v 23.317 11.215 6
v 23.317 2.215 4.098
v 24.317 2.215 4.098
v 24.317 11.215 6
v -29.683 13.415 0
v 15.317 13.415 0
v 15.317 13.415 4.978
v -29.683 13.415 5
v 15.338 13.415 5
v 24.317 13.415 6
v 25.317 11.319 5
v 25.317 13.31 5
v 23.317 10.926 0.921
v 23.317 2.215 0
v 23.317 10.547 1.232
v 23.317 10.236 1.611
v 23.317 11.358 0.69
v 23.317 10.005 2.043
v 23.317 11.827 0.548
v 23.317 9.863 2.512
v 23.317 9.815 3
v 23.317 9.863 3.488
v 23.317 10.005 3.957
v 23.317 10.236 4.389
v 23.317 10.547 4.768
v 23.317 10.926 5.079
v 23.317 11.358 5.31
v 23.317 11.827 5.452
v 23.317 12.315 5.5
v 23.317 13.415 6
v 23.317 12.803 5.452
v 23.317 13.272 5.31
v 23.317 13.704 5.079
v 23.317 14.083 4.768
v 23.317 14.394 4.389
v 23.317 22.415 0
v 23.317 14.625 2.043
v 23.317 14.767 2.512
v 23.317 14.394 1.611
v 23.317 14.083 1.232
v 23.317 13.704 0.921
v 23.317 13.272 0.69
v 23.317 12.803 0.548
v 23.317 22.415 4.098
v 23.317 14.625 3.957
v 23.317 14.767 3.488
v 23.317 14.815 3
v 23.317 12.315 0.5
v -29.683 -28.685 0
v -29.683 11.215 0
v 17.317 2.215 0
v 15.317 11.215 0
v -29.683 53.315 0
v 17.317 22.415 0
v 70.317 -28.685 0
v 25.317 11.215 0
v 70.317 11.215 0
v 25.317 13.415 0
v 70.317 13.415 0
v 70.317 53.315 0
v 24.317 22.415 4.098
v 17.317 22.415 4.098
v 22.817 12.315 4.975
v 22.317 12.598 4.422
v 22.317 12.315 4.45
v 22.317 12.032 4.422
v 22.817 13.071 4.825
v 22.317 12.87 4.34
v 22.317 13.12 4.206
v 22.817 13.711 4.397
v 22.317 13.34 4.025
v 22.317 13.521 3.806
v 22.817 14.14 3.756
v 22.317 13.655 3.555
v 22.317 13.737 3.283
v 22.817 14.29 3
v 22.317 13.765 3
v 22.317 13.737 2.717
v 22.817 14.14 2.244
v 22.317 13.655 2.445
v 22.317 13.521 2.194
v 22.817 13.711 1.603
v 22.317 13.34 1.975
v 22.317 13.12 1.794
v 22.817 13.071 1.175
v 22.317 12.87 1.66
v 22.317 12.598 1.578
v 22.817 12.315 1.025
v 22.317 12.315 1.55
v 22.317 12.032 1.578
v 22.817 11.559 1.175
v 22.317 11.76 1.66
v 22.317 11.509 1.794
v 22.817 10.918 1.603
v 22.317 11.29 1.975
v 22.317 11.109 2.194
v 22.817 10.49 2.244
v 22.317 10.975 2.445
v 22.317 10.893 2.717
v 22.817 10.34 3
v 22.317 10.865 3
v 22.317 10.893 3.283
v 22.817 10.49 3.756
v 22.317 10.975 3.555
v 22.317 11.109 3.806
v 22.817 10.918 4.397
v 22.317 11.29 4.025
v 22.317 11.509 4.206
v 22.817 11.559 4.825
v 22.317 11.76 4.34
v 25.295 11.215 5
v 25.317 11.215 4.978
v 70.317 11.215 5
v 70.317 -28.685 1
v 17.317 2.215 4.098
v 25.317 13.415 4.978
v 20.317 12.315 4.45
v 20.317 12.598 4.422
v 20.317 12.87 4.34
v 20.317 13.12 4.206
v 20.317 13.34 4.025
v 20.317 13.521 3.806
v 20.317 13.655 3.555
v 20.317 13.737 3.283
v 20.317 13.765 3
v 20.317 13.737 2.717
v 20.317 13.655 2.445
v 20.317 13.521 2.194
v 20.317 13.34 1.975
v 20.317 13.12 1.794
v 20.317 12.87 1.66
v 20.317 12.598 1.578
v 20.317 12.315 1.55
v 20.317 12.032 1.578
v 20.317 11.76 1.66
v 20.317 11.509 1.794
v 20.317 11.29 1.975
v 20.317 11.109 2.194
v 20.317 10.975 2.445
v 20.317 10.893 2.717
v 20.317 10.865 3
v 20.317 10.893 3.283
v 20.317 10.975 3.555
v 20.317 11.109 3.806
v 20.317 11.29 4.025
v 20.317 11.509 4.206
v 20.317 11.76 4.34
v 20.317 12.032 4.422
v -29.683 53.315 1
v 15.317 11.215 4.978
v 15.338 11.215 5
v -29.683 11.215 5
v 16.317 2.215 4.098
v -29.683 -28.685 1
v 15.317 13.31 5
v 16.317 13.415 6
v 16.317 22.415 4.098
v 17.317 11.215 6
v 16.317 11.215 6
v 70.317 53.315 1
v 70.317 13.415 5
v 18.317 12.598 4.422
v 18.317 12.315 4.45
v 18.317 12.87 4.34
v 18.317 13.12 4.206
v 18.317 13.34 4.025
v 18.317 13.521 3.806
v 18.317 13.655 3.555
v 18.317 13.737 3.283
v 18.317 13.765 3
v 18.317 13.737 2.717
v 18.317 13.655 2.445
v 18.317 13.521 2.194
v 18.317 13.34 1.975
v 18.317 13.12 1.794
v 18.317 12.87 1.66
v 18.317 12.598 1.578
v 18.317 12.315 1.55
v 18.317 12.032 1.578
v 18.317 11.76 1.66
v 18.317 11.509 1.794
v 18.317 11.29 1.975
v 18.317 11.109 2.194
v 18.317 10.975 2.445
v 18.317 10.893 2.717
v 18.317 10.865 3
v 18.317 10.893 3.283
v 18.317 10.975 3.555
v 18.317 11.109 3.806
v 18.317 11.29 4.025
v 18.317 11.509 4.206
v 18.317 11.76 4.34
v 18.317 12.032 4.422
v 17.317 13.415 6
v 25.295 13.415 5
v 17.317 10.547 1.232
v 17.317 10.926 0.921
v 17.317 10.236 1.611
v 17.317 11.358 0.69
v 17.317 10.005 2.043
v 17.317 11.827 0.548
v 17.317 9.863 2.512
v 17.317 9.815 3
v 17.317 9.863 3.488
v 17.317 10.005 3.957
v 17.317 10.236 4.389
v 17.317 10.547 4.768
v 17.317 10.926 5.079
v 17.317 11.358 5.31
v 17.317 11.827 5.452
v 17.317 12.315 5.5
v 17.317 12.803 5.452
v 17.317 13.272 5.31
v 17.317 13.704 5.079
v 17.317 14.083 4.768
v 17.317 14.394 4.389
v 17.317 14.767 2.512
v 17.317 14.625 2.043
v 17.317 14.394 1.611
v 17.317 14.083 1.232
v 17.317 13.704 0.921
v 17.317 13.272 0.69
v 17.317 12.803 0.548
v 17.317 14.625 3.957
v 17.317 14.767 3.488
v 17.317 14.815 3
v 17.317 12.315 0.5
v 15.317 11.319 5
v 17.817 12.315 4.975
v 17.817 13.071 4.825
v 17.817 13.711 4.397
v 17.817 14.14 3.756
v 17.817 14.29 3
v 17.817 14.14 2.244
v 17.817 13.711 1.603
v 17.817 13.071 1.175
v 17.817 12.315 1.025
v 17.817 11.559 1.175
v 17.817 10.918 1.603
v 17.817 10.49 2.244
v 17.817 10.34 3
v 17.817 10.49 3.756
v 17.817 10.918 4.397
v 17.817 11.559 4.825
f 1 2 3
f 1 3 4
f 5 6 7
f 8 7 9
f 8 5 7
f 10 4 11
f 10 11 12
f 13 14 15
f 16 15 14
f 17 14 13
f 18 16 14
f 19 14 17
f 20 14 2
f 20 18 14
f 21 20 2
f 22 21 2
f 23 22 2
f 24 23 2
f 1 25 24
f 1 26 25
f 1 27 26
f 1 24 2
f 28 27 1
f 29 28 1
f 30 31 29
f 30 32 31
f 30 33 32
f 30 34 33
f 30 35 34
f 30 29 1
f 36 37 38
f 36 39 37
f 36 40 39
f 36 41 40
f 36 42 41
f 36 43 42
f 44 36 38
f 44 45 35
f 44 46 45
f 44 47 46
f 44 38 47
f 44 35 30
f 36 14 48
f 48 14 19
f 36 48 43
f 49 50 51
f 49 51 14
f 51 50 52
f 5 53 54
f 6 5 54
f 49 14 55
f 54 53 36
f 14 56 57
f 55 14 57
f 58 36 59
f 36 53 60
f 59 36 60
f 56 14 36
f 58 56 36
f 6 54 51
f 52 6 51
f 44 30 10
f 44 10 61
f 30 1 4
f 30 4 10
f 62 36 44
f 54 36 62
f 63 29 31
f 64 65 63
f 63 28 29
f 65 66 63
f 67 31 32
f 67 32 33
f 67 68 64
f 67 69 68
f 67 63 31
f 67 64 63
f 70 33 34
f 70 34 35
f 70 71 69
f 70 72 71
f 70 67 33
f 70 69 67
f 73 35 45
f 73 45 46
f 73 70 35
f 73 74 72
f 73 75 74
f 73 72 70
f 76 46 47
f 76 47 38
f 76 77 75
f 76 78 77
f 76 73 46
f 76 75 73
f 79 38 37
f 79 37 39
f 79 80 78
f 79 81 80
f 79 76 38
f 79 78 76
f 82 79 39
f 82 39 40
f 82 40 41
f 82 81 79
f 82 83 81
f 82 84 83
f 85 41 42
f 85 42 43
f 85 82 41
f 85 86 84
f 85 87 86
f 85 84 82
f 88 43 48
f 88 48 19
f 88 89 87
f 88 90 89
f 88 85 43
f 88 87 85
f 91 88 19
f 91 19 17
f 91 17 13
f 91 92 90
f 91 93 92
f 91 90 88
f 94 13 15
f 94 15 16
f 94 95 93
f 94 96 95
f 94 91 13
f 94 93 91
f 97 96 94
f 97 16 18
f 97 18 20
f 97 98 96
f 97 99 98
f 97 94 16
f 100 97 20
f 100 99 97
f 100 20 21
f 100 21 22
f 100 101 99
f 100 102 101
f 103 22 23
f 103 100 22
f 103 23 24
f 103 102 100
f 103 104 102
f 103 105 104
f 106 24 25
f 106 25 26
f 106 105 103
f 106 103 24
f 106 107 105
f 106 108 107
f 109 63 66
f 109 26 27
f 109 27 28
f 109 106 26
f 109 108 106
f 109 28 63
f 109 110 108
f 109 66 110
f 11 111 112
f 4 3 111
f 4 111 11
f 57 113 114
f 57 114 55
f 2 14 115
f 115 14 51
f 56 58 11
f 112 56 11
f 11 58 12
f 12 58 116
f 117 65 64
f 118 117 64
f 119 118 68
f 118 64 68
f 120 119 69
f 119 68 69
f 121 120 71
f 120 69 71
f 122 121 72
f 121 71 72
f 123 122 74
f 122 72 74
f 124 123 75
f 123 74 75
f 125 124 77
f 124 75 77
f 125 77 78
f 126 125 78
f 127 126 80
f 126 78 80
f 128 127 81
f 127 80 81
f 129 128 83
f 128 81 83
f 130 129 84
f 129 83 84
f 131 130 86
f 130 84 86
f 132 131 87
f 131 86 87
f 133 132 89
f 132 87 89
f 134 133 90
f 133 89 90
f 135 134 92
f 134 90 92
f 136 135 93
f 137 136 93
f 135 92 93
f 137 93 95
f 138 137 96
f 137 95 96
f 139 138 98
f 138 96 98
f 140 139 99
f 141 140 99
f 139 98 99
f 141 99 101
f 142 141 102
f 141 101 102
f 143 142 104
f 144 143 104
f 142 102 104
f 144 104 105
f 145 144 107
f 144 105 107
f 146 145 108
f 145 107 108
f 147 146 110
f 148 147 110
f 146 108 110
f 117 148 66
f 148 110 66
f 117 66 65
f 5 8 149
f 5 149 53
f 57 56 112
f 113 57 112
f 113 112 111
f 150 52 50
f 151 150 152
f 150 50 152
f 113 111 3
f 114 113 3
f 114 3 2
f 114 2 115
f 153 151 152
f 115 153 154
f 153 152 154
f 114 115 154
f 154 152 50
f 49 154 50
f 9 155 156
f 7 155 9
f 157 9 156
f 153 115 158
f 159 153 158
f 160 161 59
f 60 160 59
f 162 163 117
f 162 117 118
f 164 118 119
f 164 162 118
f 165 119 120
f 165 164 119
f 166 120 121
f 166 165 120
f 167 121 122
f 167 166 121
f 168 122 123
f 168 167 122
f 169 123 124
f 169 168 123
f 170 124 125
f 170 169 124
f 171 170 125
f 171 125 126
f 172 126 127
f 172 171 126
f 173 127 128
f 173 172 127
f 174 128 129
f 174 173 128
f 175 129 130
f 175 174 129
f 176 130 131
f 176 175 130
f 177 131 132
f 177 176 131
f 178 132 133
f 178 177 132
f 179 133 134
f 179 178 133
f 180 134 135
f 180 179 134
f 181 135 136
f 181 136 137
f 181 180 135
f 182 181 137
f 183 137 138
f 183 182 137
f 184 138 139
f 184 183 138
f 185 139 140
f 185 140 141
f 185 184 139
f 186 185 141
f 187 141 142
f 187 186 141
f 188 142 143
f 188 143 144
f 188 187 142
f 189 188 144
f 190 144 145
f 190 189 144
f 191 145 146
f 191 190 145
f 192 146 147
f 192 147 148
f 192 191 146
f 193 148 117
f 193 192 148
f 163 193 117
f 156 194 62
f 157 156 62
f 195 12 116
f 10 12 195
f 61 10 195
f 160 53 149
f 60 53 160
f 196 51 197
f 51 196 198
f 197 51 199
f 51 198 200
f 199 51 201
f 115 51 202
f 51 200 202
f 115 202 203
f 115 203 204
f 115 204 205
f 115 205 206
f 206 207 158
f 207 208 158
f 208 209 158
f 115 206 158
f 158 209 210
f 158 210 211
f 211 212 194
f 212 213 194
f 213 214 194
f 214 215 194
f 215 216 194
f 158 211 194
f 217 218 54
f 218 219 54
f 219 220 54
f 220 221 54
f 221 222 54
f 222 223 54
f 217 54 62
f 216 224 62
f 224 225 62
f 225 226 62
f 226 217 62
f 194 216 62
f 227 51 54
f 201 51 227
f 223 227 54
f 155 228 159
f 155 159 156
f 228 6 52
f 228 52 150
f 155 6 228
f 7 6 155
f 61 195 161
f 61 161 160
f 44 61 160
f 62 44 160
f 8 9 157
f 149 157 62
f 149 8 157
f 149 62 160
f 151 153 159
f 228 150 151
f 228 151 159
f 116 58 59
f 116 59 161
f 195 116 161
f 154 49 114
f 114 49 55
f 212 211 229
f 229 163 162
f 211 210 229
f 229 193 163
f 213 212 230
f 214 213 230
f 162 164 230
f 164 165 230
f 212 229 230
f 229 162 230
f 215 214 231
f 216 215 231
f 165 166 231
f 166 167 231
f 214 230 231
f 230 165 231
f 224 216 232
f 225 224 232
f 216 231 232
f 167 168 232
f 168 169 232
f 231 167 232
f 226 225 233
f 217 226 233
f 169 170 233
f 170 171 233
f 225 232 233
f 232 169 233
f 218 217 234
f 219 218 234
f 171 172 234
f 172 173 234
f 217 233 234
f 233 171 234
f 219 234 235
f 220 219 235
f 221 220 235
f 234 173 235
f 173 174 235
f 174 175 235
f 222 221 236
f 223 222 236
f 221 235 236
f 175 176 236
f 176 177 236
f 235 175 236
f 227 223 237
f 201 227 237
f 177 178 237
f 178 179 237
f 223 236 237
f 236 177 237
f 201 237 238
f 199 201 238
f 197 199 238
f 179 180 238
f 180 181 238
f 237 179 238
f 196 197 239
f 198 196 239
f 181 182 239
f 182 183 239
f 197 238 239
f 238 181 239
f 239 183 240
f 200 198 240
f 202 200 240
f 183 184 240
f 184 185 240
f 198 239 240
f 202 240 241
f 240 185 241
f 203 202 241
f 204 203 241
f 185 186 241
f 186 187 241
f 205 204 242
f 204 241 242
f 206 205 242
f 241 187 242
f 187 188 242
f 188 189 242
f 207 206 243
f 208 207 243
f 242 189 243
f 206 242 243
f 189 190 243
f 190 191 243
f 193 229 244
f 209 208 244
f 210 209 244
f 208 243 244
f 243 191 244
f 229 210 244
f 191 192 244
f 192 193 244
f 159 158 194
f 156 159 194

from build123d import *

# Parameters (mm, degrees)
DODANIE_WYCI_GNI_CIE1_DEPTH = 1
DODANIE_WYCI_GNI_CIE2_DEPTH = 100
SZKIC3_W                    = 6
SZKIC3_H                    = 9
WYTNIJ_WYCI_GNI_CIE1_DEPTH  = 10
SZKIC4_W                    = 2
SZKIC4_H                    = 5
DODANIE_WYCI_GNI_CIE3_DEPTH = 1.1
DODANIE_WYCI_GNI_CIE5_DEPTH = 2
SZKIC8_R                    = 2.5
SZKIC9_R                    = 1.45
SZKIC10_R                   = 1.45
DODANIE_WYCI_GNI_CIE6_DEPTH = 2
SFAZOWANIE1_SIZE            = 1


with BuildPart() as part:
    # Szkic1 → Dodanie-wyciągnięcie1 (new body)
    with BuildSketch(Plane.XY):
        Polygon((15.316574048, 11.214895549), (-29.683425952, 11.214895549), (-29.683425952, -28.685104451), (70.316574048, -28.685104451), (70.316574048, 11.214895549), (25.316574048, 11.214895549), align=None)
    extrude(amount=DODANIE_WYCI_GNI_CIE1_DEPTH)

    # Szkic2 → Dodanie-wyciągnięcie2 (add)
    with BuildSketch(Plane.ZY.offset(29.683425952)):
        Polygon((1, 11.214895549), (5, 11.214895549), (1, -28.685104451), align=None)
    extrude(amount=-DODANIE_WYCI_GNI_CIE2_DEPTH)

    # Szkic3 → Wytnij-wyciągnięcie1 (cut)
    with BuildSketch(Plane(origin=(0, 0, 0), x_dir=(-1, 0, 0), z_dir=(0, 0, -1))):
        with Locations((-20.316574048, 6.714895549)):
            Rectangle(SZKIC3_W, SZKIC3_H)
    extrude(amount=-WYTNIJ_WYCI_GNI_CIE1_DEPTH, mode=Mode.SUBTRACT)

    # Szkic4 → Dodanie-wyciągnięcie3 (add)
    with BuildSketch(Plane(origin=(0, 11.214895549, 0), x_dir=(1, 0, 0), z_dir=(0, 1, 0))):
        with Locations((24.316574048, -2.5)):
            Rectangle(SZKIC4_W, SZKIC4_H)
        with Locations((16.316574048, -2.5)):
            Rectangle(SZKIC4_W, SZKIC4_H)
    extrude(amount=DODANIE_WYCI_GNI_CIE3_DEPTH)

    # Lustro2: part across plane


with BuildPart() as part_1:
    add(part.part)
    add(part.part.mirror(Plane.ZX.offset(12.314895549)))

    # Szkic7 → Dodanie-wyciągnięcie5 (add)
    with BuildSketch(Plane.ZY.offset(-23.316574048)):
        Polygon((4.097744361, 22.414895549), (5, 13.414895549), (5, 11.214895549), (4.097744361, 2.214895549), (6, 11.214895549), (6, 13.414895549), align=None)
    dodanie_wyci_gni_cie5 = extrude(amount=-DODANIE_WYCI_GNI_CIE5_DEPTH)

    # Szkic8 → Wyciągnięcie po profilach1 section 0
    with BuildSketch(Plane.ZY.offset(-23.316574048)):
        with Locations((3, 12.314895549)):
            Circle(SZKIC8_R)
    # Szkic9 → Wyciągnięcie po profilach1 section 1
    with BuildSketch(Plane.ZY.offset(-22.316574048)):
        with Locations((3, 12.314895549)):
            Circle(SZKIC9_R)
    wyci_gni_cie_po_profilach1 = loft()

    # Szkic10 → Dodanie-wyciągnięcie6 (add)
    with BuildSketch(Plane.ZY.offset(-22.316574048)):
        with Locations((3, 12.314895549)):
            Circle(SZKIC10_R)
    dodanie_wyci_gni_cie6 = extrude(amount=DODANIE_WYCI_GNI_CIE6_DEPTH)

    # Lustro3: Dodanie-wyciągnięcie5, Wyciągnięcie po profilach1, Dodanie-wyciągnięcie6 across plane
    add(dodanie_wyci_gni_cie5.mirror(Plane(origin=(20.316574048, 12.314895549, 3), x_dir=(0, 0, 1), z_dir=(-1, 0, 0))))
    add(wyci_gni_cie_po_profilach1.mirror(Plane(origin=(20.316574048, 12.314895549, 3), x_dir=(0, 0, 1), z_dir=(-1, 0, 0))))
    add(dodanie_wyci_gni_cie6.mirror(Plane(origin=(20.316574048, 12.314895549, 3), x_dir=(0, 0, 1), z_dir=(-1, 0, 0))))

    # Sfazowanie1
    sfazowanie1_edges = [part_1.edges().sort_by_distance(p)[0] for p in [
        (15.316574048, 6.714895549, 5.04887218),
        (15.316574048, 12.314895549, 6),
        (15.316574048, 17.914895549, 5.04887218),
        (25.316574048, 17.914895549, 5.04887218),
        (25.316574048, 12.314895549, 6),
        (25.316574048, 6.714895549, 5.04887218),
    ]]
    chamfer(sfazowanie1_edges, length=SFAZOWANIE1_SIZE)


solid = part_1.part
